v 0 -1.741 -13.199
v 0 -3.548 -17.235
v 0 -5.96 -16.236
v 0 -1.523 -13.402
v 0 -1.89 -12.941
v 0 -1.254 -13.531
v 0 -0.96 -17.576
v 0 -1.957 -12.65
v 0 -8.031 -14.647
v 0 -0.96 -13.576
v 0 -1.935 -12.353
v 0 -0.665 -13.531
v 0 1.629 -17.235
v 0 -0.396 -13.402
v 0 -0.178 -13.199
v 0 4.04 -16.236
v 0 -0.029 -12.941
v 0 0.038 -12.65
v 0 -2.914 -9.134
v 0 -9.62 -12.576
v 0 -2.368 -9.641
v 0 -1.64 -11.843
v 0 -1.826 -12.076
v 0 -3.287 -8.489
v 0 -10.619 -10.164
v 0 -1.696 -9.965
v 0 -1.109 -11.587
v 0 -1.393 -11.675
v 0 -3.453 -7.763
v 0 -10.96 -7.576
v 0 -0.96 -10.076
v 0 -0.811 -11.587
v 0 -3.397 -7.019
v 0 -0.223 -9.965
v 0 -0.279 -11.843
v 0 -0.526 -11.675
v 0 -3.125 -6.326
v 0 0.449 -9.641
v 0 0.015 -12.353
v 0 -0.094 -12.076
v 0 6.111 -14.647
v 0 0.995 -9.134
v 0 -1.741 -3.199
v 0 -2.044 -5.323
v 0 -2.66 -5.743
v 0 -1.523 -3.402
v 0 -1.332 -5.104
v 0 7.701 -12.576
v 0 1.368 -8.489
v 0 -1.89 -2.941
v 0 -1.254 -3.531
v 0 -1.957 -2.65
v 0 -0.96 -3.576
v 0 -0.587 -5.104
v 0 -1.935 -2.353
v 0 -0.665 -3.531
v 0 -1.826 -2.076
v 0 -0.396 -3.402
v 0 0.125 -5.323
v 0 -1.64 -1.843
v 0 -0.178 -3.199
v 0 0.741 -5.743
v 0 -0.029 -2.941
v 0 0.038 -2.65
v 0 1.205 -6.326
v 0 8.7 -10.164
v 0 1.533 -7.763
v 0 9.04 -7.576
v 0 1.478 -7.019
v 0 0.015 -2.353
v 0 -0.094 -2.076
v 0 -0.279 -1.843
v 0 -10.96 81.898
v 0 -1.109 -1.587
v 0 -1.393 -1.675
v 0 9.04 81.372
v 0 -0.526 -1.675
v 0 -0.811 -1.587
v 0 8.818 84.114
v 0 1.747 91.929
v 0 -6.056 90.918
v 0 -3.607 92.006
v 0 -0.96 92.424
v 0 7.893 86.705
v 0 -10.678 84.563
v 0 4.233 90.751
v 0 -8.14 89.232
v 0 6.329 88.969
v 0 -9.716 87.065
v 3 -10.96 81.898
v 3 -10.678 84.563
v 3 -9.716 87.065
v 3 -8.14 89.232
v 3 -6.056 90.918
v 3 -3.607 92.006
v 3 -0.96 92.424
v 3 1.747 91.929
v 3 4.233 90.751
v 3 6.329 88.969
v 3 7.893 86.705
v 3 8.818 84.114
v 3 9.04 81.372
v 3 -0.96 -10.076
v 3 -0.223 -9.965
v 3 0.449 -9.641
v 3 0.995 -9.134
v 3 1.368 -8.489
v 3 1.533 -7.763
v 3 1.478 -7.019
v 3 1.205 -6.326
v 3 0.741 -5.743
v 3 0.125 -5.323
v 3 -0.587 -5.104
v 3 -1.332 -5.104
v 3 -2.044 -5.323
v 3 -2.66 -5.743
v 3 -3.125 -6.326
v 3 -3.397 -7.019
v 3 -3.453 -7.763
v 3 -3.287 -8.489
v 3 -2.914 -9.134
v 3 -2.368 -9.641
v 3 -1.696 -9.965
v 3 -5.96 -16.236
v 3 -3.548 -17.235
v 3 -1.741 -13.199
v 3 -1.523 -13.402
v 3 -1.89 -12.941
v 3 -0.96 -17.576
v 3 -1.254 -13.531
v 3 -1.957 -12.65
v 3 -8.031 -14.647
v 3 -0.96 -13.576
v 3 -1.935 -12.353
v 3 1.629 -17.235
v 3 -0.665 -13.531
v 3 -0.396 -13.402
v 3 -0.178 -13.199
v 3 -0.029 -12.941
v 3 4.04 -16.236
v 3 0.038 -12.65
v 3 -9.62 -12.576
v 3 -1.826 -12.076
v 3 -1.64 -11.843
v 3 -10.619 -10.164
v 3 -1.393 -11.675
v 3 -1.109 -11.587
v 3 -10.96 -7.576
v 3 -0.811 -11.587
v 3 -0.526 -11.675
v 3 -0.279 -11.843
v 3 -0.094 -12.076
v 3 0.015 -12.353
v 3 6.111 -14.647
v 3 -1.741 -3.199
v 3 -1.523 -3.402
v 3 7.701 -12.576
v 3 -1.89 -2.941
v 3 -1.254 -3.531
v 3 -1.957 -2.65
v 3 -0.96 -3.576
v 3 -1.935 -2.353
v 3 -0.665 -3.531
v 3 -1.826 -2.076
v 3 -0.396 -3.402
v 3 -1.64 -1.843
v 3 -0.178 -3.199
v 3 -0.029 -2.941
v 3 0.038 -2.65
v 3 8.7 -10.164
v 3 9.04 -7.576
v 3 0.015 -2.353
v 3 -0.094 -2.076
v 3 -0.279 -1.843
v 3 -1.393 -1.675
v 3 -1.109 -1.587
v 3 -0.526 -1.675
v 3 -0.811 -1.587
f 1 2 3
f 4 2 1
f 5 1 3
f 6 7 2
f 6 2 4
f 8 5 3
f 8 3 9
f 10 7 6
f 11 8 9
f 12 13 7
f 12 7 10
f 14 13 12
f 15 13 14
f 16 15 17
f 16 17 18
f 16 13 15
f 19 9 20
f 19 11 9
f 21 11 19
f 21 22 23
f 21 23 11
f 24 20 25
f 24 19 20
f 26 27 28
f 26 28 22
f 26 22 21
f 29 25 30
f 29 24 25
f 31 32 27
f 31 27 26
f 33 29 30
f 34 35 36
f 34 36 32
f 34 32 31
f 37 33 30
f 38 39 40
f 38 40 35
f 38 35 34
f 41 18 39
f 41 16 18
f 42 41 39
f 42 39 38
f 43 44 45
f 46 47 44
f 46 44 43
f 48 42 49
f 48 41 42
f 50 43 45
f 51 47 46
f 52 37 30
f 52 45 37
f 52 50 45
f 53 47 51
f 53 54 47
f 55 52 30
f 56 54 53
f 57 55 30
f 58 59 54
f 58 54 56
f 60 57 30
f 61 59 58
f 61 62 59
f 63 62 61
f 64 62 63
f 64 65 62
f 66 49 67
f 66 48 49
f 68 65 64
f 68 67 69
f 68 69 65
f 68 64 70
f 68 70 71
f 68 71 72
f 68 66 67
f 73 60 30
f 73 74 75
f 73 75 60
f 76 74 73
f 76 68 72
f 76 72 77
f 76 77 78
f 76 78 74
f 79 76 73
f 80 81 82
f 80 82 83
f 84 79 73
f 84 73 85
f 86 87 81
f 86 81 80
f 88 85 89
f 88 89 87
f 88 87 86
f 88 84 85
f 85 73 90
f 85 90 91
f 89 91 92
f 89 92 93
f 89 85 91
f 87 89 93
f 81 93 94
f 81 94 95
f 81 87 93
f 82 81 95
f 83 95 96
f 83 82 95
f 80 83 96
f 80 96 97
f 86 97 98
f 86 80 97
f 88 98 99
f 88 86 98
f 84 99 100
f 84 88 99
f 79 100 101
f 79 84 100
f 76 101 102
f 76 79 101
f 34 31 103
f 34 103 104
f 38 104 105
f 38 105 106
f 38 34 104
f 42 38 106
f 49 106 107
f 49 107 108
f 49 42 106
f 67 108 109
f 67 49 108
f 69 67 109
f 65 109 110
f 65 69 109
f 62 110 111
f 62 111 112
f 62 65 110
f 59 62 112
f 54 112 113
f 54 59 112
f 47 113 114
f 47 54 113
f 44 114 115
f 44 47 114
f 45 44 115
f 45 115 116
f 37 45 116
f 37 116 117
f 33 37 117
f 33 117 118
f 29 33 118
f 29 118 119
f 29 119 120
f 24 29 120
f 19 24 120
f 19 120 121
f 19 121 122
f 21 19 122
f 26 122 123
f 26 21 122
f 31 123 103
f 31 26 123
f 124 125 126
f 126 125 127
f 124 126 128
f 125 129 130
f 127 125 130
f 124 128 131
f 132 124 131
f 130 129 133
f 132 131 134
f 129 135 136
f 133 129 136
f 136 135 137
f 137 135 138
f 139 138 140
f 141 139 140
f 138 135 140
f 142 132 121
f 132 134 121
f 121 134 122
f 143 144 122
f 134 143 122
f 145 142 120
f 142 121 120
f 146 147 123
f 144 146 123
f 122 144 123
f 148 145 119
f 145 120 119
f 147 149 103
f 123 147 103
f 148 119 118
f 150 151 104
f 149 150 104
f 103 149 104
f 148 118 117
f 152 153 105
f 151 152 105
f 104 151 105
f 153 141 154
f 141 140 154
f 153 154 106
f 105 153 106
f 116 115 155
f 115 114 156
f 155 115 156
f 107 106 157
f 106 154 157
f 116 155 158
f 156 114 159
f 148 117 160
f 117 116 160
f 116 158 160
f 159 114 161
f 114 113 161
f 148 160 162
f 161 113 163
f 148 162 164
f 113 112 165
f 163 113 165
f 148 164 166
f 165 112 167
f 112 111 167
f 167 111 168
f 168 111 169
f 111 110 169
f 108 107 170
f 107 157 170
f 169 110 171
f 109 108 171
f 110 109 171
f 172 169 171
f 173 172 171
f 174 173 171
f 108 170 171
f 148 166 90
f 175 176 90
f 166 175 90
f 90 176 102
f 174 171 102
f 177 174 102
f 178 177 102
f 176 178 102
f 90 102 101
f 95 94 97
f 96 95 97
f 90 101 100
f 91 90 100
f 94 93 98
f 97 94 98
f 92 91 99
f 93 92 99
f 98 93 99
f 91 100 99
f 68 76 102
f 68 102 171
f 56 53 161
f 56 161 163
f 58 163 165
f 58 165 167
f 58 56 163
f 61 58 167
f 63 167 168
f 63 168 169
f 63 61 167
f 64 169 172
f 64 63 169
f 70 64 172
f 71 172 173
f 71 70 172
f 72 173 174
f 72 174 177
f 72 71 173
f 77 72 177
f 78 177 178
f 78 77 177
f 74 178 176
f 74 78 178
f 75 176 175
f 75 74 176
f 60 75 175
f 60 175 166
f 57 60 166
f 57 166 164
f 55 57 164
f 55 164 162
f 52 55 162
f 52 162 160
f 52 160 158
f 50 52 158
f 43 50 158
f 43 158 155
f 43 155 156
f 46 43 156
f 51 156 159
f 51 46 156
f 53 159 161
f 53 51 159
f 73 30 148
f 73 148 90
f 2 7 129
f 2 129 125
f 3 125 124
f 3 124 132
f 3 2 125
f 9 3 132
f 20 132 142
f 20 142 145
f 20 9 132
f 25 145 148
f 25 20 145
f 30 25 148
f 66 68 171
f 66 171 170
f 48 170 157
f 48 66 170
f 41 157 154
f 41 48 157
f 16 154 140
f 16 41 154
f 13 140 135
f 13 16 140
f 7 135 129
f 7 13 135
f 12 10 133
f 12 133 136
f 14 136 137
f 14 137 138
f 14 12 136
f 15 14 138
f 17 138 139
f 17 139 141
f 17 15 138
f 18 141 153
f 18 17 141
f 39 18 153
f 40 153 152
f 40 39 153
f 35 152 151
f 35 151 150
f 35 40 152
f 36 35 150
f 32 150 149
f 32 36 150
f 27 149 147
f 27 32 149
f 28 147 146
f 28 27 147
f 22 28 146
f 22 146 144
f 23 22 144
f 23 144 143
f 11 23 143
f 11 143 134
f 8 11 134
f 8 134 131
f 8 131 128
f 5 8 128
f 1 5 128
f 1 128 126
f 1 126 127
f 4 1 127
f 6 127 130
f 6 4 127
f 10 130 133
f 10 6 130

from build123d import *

# Parameters (mm, degrees)
SKETCH1_R           = 2.5
SKETCH1_R_2         = 1
BOSS_EXTRUDE1_DEPTH = 3


with BuildPart() as part:
    # Sketch1 → Boss-Extrude1 (new body)
    with BuildSketch(Plane(origin=(0, 0, 0), x_dir=(0, 0, -1), z_dir=(1, 0, 0))):
        with BuildLine():
            Line((-81.371714004, 9.04040404), (7.575757576, 9.04040404))
            ThreePointArc((7.575757576, 9.04040404), (14.646825388, 6.111471852), (17.575757576, -0.95959596))
            ThreePointArc((17.575757576, -0.95959596), (14.646825388, -8.030663771), (7.575757576, -10.95959596))
            Line((7.575757576, -10.95959596), (-81.897978214, -10.95959596))
            ThreePointArc((-81.897978214, -10.95959596), (-89.232178131, -8.139656658), (-92.424242424, -0.95959596))
            ThreePointArc((-92.424242424, -0.95959596), (-88.969046026, 6.329457626), (-81.371714004, 9.04040404))
        make_face()
        with Locations((7.575757576, -0.95959596)):
            Circle(SKETCH1_R, mode=Mode.SUBTRACT)
        with Locations((12.575757576, -0.95959596)):
            Circle(SKETCH1_R_2, mode=Mode.SUBTRACT)
        with Locations((2.575757576, -0.95959596)):
            Circle(SKETCH1_R_2, mode=Mode.SUBTRACT)
    extrude(amount=BOSS_EXTRUDE1_DEPTH)


solid = part.part
